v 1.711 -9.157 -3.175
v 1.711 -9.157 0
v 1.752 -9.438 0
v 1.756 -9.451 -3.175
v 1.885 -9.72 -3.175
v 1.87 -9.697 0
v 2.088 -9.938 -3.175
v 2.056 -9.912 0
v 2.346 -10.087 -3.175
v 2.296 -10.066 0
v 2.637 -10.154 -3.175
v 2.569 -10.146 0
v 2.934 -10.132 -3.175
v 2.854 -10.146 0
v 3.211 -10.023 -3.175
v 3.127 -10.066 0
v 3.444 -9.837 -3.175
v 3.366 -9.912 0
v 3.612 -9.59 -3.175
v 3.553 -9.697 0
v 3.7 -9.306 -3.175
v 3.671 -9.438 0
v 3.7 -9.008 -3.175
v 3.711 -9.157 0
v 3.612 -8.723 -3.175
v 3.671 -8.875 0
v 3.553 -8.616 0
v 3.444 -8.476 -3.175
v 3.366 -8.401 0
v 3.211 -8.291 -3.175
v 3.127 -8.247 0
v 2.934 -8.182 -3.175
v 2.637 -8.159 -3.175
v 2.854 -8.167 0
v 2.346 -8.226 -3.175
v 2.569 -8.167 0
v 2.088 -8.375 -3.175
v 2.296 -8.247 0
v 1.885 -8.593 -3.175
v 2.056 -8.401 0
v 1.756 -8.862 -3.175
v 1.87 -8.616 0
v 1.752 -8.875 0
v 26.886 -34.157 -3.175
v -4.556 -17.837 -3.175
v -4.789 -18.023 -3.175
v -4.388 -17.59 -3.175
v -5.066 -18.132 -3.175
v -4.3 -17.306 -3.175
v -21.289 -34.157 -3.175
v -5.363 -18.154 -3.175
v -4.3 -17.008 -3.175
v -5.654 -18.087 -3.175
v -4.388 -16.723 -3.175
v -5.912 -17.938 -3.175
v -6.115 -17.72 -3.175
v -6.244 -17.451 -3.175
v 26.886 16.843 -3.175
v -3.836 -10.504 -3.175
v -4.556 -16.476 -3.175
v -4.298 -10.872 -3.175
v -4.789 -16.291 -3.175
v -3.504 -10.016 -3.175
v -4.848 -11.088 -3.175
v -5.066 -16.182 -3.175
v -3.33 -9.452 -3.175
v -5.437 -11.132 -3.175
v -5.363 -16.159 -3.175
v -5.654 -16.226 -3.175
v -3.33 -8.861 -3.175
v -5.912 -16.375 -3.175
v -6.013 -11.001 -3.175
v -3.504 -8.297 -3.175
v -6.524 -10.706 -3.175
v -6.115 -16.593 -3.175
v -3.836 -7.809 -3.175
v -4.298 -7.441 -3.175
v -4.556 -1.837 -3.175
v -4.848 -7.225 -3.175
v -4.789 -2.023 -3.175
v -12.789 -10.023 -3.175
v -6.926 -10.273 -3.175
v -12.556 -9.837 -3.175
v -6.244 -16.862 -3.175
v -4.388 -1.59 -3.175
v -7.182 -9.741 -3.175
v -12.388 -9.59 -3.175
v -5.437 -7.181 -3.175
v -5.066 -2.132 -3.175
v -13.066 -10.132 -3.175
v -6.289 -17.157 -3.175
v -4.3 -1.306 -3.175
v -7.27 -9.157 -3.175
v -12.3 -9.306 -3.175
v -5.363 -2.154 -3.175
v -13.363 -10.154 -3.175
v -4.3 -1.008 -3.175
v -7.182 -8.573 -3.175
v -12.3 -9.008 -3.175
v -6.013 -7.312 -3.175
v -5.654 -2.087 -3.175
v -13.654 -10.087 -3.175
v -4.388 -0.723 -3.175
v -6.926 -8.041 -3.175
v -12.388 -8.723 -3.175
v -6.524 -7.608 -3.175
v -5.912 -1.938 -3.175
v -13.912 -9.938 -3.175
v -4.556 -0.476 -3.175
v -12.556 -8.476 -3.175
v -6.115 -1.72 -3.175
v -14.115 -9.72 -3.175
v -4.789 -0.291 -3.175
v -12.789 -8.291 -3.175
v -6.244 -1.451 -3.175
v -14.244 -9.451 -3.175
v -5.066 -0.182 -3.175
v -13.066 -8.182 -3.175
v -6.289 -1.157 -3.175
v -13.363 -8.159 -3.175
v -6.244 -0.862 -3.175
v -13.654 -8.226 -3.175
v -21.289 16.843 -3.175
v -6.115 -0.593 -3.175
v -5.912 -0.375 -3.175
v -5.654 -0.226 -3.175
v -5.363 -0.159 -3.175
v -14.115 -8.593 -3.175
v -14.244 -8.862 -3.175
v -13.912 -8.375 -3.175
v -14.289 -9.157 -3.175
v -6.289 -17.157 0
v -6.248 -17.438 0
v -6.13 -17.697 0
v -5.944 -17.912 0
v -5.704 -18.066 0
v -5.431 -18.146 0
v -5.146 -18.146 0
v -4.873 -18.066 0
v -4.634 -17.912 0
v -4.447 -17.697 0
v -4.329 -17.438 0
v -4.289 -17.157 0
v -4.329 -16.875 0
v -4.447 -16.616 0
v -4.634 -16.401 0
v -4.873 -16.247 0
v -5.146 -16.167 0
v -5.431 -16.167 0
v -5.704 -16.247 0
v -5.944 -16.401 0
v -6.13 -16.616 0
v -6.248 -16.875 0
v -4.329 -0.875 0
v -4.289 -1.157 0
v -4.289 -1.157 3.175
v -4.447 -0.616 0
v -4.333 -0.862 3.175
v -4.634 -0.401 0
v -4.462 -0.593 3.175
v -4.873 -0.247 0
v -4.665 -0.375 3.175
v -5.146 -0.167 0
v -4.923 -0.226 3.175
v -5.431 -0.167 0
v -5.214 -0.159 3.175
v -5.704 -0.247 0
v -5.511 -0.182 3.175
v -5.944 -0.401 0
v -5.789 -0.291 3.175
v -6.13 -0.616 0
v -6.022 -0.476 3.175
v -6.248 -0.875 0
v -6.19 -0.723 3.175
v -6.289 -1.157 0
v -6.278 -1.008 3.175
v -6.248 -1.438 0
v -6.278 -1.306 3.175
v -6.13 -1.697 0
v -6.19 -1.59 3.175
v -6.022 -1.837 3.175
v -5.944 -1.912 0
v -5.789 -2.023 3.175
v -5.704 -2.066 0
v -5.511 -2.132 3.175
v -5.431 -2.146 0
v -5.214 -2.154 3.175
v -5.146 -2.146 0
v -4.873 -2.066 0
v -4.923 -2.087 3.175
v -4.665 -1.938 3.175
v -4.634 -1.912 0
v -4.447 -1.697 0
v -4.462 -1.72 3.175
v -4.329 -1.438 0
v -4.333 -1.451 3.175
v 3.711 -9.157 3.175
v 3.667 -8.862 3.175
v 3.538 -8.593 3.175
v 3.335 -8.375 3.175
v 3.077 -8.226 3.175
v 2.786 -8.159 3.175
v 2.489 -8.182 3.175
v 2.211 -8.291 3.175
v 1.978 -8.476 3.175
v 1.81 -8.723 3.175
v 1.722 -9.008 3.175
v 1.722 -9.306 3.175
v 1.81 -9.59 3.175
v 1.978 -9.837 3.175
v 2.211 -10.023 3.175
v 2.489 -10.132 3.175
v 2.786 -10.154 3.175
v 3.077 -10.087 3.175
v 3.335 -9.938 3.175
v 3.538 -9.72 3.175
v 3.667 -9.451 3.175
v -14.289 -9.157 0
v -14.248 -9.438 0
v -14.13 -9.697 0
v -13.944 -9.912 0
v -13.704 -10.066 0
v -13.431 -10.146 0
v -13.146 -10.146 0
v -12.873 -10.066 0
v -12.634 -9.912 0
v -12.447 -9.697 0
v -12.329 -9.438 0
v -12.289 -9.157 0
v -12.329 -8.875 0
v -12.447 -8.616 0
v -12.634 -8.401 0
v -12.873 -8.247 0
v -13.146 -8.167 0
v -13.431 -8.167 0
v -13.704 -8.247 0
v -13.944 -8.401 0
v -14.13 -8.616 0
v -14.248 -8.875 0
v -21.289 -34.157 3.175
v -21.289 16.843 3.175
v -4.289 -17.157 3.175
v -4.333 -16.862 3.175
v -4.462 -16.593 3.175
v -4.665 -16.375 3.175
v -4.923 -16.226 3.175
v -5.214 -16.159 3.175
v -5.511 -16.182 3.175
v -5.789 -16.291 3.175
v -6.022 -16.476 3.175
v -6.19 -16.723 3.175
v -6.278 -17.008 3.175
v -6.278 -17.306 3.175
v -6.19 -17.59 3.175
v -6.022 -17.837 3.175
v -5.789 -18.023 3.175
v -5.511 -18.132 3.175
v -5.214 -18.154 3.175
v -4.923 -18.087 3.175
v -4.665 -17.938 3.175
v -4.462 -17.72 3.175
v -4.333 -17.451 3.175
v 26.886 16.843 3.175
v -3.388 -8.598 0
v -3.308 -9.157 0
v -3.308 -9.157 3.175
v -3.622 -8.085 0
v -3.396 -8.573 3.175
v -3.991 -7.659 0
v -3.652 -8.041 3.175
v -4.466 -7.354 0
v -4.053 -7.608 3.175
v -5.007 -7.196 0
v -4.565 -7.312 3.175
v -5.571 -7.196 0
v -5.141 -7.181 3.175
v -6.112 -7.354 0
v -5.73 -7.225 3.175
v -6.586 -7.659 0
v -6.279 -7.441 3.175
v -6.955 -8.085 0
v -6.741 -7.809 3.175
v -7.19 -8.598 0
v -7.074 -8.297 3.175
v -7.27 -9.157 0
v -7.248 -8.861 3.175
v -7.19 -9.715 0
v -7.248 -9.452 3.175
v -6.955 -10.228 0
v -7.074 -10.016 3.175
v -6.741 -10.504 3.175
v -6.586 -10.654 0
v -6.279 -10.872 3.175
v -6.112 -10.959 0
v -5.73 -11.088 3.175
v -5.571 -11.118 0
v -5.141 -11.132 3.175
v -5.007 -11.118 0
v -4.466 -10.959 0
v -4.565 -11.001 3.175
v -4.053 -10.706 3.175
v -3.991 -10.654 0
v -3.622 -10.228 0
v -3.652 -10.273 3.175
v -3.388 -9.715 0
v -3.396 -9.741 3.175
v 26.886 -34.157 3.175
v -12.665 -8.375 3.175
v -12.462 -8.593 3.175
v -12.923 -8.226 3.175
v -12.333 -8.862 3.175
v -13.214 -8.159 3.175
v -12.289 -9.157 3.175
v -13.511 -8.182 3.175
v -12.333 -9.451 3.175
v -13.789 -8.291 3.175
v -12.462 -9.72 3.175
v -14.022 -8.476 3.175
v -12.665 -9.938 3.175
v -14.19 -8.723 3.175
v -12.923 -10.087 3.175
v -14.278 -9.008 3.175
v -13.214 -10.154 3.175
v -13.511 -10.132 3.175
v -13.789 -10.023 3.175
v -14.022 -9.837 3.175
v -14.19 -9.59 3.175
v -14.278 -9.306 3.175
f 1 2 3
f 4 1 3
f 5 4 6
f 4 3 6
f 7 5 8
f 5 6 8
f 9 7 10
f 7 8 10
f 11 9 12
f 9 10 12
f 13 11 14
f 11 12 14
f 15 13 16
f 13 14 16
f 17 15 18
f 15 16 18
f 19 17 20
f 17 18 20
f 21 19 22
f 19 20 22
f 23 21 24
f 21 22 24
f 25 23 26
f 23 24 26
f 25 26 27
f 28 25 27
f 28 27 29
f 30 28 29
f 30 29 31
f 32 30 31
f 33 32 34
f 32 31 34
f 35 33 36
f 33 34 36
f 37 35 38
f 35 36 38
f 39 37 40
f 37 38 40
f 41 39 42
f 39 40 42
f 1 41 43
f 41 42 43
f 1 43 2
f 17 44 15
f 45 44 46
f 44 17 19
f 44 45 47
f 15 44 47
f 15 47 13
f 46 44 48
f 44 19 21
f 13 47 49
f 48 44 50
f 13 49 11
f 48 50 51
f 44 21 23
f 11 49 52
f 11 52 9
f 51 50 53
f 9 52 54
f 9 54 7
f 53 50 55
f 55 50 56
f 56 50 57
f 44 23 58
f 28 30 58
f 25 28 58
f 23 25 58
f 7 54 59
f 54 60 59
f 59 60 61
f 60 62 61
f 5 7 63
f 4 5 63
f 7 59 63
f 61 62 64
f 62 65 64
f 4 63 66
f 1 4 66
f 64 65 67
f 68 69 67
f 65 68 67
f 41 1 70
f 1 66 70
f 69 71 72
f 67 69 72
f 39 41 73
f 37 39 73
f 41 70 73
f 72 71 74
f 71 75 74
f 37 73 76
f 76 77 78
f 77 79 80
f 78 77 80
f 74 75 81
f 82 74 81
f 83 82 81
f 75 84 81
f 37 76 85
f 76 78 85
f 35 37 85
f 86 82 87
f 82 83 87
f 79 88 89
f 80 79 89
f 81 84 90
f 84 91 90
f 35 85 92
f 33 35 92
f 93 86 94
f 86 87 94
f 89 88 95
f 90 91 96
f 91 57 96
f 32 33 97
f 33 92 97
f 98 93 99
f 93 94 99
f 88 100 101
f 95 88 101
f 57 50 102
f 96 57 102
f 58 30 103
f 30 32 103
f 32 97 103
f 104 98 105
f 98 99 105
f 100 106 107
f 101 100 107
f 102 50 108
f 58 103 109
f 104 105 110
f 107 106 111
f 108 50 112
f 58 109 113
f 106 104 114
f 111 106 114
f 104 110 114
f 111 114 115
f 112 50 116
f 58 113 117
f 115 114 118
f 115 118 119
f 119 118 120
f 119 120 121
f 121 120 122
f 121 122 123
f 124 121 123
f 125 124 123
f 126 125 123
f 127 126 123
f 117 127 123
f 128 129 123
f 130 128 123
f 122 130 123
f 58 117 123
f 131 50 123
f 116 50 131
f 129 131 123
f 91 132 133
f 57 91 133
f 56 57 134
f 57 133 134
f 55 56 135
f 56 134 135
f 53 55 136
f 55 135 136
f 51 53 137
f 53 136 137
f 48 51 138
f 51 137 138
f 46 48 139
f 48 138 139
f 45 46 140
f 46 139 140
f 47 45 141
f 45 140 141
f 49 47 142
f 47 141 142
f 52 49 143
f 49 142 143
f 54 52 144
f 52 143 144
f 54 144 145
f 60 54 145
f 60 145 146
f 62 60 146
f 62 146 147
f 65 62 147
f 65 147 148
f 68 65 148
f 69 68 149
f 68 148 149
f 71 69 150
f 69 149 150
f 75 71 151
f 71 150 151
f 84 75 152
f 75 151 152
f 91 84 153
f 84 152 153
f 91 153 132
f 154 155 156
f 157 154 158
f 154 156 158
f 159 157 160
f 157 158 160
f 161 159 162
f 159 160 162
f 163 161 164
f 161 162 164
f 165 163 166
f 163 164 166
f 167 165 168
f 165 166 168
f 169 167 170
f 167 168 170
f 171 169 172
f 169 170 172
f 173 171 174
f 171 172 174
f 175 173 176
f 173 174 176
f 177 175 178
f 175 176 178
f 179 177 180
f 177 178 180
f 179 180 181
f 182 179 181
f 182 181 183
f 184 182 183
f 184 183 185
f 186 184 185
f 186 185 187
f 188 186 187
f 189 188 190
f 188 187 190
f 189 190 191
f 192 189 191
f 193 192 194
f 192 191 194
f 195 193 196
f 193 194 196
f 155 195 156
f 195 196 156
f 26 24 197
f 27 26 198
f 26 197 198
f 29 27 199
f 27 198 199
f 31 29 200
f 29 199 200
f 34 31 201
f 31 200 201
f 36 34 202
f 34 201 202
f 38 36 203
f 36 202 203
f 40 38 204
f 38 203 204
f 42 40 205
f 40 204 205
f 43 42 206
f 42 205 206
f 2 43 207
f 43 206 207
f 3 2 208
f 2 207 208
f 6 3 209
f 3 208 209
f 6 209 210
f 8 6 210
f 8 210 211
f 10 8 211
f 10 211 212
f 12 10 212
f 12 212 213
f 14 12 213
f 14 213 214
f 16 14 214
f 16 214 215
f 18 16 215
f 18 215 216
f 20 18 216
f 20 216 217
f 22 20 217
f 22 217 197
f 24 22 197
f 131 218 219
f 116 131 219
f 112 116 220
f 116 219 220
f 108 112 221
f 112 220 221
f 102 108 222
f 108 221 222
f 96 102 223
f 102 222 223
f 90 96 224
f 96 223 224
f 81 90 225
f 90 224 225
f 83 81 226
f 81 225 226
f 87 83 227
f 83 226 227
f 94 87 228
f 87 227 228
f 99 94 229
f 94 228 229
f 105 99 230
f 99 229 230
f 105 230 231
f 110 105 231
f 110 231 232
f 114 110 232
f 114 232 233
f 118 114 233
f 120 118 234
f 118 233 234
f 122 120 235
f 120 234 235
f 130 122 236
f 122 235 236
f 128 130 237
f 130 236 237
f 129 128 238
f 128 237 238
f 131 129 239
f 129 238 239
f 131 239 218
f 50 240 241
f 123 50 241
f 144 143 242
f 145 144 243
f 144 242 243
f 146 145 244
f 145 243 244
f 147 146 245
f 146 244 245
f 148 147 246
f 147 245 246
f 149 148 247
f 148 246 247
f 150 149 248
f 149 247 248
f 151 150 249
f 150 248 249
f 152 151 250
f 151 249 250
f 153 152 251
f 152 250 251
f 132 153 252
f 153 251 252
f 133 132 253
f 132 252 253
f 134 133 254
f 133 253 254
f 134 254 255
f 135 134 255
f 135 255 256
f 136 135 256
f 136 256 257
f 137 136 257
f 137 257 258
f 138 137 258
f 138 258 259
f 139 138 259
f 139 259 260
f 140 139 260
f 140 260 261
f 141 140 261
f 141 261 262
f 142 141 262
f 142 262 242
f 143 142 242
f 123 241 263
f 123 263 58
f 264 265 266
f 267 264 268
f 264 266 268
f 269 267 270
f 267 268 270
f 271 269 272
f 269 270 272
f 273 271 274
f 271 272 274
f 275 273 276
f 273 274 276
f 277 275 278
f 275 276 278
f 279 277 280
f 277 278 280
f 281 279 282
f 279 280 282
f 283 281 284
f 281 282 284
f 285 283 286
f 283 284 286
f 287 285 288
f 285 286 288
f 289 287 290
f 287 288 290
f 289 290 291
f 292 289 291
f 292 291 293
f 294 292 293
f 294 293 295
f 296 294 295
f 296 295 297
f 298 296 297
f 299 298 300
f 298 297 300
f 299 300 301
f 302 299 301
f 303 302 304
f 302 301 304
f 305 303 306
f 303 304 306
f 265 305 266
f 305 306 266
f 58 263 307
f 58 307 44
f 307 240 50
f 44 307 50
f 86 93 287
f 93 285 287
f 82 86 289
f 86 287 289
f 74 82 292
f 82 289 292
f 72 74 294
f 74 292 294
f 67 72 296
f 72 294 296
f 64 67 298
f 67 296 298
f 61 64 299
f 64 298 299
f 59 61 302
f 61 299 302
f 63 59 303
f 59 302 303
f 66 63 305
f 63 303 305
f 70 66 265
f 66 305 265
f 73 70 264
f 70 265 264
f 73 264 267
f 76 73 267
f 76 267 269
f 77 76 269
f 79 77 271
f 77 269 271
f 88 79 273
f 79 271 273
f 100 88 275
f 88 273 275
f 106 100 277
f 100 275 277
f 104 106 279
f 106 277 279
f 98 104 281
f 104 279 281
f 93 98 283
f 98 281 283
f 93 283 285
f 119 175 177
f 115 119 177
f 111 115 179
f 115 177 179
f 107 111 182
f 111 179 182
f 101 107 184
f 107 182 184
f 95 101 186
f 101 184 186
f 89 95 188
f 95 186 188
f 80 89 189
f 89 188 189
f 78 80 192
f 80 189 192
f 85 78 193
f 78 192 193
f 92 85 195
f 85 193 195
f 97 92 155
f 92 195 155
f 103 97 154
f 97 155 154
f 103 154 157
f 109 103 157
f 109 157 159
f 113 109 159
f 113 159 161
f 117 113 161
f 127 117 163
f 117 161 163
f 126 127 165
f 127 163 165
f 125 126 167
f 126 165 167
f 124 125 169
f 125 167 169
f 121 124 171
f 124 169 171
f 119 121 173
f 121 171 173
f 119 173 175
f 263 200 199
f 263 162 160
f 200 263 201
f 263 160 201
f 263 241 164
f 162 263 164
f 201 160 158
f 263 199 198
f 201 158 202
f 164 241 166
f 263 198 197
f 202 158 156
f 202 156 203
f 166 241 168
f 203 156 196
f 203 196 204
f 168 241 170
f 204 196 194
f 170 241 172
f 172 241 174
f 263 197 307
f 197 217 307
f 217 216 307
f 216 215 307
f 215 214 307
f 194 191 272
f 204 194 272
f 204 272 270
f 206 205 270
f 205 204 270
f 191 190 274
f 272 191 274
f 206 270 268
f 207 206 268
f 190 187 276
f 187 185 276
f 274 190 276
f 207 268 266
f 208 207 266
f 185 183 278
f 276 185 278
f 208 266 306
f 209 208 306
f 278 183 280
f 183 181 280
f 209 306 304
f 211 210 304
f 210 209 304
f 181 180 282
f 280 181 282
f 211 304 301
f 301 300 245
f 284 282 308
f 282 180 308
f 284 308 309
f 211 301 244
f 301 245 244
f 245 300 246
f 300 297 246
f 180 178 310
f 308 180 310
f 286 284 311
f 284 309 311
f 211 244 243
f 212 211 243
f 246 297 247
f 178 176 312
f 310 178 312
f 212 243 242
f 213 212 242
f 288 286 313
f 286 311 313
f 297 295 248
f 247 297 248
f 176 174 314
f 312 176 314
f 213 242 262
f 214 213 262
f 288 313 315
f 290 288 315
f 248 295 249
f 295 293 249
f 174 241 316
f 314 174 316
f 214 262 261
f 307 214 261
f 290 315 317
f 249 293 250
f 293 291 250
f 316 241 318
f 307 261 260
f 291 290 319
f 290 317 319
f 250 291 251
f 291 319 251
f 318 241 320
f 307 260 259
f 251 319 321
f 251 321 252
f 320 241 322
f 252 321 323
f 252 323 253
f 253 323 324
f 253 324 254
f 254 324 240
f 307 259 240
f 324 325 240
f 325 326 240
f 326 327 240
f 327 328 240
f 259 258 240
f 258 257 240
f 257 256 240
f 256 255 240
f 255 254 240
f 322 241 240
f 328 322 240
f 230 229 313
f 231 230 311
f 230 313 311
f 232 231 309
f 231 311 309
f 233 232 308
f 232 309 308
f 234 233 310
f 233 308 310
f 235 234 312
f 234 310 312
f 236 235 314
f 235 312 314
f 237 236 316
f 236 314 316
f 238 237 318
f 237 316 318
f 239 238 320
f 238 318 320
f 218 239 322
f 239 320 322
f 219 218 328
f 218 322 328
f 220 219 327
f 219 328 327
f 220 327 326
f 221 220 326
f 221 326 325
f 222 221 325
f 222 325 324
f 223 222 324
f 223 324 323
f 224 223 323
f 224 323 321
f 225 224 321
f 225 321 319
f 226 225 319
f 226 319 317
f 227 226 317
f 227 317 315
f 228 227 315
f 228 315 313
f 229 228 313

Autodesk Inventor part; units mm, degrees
ref_plane "YZ Plane" through (0, 0, 0) normal (1, 0, 0) x (0, 1, 0)
ref_plane "XZ Plane" through (0, 0, 0) normal (0, 1, 0) x (-1, 0, 0)
ref_plane "XY Plane" through (0, 0, 0) normal (0, 0, 1) x (1, 0, 0)
sketch "Sketch1" plane through (0, 0, 0) normal (0, 0, 1) x (1, 0, 0)
  line L0 (-21.2887, 16.8434) -> (23.7113, 16.8434)
  line L1 (23.7113, 16.8434) -> (23.7113, -34.1566)
  line L2 (23.7113, -34.1566) -> (-21.2887, -34.1566)
  line L3 (-21.2887, -34.1566) -> (-21.2887, 16.8434)
  point P0 (0, 0)
  dimension "d0" = 45
  dimension "d1" = 51
extrude "Extrusion1" add sketch "Sketch1" along normal blind 3.175
sketch "Sketch2" plane through (0, 0, 3.175) normal (0, 0, 1) x (1, 0, 0)
  line L0 (-21.2887, -34.1566) -> (-21.2887, 16.8434) projected
  line L1 (-21.2887, -34.1566) -> (-21.2887, -9.1566)
  circle A0 centre (-5.2887, -9.1566) radius 8
  circle A1 centre (-13.2887, -9.1566) radius 1
  circle A2 centre (-5.2887, -1.1566) radius 1
  circle A3 centre (2.7113, -9.1566) radius 1
  circle A4 centre (-5.2887, -17.1566) radius 1
  point P0 (0, 0)
  dimension "d4" = 25
  dimension "d6" = 16
  dimension "d7" = 2
  dimension "d8" = 2
  dimension "d9" = 2
  dimension "d10" = 2
  dimension "d11" = 16
extrude "Extrusion2" cut sketch "Sketch2" against normal blind 25.4 contours A0 A3 | A0 A3 | A2 A0 | A0 A2 | A4 A0 | A0 A4 | A1 A0 | A0 A1
sketch "Sketch3" plane through (0, 0, 3.175) normal (0, 0, 1) x (1, 0, 0)
  circle A0 centre (-5.2887, -9.1566) radius 1.9812
  point P0 (0, 0)
  dimension "d14" = 3.9624
extrude "Extrusion3" cut sketch "Sketch3" against normal blind 25.4
sketch "Sketch4" plane through (0, 0, 0) normal (0, 0, -1) x (-1, 0, 0)
  circle A0 centre (5.2887, -9.1566) radius 1.9812 projected
  circle A1 centre (5.2887, -17.1566) radius 1 projected
  circle A2 centre (13.2887, -9.1566) radius 1 projected
  circle A3 centre (5.2887, -1.1566) radius 1 projected
  circle A4 centre (-2.7113, -9.1566) radius 1 projected
  line L0 (21.2887, 16.8434) -> (-23.7113, 16.8434) projected
  line L1 (-23.7113, 16.8434) -> (-23.7113, -34.1566) projected
  line L2 (-23.7113, -34.1566) -> (21.2887, -34.1566) projected
  line L3 (21.2887, -34.1566) -> (21.2887, 16.8434) projected
  line L4 (-23.7113, -34.1566) -> (-17.3613, -34.1566)
  point P0 (0, 0)
  dimension "d17" = 6.35
extrude "Extrusion4" add sketch "Sketch4" along normal blind 3.175
sketch "Sketch5" plane through (23.7113, -34.1566, 3.175) normal (1, 0, 0) x (0, 0, -1)
  line L0 (0, 51) -> (0, 0) projected
  line L1 (0, 0) -> (6.35, 0) projected
  line L2 (6.35, 0) -> (6.35, 51) projected
  line L3 (0, 51) -> (6.35, 51) projected
  point P0 (3.175, 34.1566)
extrude "Extrusion5" add sketch "Sketch5" along normal blind 3.175
properties part number "sidebase"
